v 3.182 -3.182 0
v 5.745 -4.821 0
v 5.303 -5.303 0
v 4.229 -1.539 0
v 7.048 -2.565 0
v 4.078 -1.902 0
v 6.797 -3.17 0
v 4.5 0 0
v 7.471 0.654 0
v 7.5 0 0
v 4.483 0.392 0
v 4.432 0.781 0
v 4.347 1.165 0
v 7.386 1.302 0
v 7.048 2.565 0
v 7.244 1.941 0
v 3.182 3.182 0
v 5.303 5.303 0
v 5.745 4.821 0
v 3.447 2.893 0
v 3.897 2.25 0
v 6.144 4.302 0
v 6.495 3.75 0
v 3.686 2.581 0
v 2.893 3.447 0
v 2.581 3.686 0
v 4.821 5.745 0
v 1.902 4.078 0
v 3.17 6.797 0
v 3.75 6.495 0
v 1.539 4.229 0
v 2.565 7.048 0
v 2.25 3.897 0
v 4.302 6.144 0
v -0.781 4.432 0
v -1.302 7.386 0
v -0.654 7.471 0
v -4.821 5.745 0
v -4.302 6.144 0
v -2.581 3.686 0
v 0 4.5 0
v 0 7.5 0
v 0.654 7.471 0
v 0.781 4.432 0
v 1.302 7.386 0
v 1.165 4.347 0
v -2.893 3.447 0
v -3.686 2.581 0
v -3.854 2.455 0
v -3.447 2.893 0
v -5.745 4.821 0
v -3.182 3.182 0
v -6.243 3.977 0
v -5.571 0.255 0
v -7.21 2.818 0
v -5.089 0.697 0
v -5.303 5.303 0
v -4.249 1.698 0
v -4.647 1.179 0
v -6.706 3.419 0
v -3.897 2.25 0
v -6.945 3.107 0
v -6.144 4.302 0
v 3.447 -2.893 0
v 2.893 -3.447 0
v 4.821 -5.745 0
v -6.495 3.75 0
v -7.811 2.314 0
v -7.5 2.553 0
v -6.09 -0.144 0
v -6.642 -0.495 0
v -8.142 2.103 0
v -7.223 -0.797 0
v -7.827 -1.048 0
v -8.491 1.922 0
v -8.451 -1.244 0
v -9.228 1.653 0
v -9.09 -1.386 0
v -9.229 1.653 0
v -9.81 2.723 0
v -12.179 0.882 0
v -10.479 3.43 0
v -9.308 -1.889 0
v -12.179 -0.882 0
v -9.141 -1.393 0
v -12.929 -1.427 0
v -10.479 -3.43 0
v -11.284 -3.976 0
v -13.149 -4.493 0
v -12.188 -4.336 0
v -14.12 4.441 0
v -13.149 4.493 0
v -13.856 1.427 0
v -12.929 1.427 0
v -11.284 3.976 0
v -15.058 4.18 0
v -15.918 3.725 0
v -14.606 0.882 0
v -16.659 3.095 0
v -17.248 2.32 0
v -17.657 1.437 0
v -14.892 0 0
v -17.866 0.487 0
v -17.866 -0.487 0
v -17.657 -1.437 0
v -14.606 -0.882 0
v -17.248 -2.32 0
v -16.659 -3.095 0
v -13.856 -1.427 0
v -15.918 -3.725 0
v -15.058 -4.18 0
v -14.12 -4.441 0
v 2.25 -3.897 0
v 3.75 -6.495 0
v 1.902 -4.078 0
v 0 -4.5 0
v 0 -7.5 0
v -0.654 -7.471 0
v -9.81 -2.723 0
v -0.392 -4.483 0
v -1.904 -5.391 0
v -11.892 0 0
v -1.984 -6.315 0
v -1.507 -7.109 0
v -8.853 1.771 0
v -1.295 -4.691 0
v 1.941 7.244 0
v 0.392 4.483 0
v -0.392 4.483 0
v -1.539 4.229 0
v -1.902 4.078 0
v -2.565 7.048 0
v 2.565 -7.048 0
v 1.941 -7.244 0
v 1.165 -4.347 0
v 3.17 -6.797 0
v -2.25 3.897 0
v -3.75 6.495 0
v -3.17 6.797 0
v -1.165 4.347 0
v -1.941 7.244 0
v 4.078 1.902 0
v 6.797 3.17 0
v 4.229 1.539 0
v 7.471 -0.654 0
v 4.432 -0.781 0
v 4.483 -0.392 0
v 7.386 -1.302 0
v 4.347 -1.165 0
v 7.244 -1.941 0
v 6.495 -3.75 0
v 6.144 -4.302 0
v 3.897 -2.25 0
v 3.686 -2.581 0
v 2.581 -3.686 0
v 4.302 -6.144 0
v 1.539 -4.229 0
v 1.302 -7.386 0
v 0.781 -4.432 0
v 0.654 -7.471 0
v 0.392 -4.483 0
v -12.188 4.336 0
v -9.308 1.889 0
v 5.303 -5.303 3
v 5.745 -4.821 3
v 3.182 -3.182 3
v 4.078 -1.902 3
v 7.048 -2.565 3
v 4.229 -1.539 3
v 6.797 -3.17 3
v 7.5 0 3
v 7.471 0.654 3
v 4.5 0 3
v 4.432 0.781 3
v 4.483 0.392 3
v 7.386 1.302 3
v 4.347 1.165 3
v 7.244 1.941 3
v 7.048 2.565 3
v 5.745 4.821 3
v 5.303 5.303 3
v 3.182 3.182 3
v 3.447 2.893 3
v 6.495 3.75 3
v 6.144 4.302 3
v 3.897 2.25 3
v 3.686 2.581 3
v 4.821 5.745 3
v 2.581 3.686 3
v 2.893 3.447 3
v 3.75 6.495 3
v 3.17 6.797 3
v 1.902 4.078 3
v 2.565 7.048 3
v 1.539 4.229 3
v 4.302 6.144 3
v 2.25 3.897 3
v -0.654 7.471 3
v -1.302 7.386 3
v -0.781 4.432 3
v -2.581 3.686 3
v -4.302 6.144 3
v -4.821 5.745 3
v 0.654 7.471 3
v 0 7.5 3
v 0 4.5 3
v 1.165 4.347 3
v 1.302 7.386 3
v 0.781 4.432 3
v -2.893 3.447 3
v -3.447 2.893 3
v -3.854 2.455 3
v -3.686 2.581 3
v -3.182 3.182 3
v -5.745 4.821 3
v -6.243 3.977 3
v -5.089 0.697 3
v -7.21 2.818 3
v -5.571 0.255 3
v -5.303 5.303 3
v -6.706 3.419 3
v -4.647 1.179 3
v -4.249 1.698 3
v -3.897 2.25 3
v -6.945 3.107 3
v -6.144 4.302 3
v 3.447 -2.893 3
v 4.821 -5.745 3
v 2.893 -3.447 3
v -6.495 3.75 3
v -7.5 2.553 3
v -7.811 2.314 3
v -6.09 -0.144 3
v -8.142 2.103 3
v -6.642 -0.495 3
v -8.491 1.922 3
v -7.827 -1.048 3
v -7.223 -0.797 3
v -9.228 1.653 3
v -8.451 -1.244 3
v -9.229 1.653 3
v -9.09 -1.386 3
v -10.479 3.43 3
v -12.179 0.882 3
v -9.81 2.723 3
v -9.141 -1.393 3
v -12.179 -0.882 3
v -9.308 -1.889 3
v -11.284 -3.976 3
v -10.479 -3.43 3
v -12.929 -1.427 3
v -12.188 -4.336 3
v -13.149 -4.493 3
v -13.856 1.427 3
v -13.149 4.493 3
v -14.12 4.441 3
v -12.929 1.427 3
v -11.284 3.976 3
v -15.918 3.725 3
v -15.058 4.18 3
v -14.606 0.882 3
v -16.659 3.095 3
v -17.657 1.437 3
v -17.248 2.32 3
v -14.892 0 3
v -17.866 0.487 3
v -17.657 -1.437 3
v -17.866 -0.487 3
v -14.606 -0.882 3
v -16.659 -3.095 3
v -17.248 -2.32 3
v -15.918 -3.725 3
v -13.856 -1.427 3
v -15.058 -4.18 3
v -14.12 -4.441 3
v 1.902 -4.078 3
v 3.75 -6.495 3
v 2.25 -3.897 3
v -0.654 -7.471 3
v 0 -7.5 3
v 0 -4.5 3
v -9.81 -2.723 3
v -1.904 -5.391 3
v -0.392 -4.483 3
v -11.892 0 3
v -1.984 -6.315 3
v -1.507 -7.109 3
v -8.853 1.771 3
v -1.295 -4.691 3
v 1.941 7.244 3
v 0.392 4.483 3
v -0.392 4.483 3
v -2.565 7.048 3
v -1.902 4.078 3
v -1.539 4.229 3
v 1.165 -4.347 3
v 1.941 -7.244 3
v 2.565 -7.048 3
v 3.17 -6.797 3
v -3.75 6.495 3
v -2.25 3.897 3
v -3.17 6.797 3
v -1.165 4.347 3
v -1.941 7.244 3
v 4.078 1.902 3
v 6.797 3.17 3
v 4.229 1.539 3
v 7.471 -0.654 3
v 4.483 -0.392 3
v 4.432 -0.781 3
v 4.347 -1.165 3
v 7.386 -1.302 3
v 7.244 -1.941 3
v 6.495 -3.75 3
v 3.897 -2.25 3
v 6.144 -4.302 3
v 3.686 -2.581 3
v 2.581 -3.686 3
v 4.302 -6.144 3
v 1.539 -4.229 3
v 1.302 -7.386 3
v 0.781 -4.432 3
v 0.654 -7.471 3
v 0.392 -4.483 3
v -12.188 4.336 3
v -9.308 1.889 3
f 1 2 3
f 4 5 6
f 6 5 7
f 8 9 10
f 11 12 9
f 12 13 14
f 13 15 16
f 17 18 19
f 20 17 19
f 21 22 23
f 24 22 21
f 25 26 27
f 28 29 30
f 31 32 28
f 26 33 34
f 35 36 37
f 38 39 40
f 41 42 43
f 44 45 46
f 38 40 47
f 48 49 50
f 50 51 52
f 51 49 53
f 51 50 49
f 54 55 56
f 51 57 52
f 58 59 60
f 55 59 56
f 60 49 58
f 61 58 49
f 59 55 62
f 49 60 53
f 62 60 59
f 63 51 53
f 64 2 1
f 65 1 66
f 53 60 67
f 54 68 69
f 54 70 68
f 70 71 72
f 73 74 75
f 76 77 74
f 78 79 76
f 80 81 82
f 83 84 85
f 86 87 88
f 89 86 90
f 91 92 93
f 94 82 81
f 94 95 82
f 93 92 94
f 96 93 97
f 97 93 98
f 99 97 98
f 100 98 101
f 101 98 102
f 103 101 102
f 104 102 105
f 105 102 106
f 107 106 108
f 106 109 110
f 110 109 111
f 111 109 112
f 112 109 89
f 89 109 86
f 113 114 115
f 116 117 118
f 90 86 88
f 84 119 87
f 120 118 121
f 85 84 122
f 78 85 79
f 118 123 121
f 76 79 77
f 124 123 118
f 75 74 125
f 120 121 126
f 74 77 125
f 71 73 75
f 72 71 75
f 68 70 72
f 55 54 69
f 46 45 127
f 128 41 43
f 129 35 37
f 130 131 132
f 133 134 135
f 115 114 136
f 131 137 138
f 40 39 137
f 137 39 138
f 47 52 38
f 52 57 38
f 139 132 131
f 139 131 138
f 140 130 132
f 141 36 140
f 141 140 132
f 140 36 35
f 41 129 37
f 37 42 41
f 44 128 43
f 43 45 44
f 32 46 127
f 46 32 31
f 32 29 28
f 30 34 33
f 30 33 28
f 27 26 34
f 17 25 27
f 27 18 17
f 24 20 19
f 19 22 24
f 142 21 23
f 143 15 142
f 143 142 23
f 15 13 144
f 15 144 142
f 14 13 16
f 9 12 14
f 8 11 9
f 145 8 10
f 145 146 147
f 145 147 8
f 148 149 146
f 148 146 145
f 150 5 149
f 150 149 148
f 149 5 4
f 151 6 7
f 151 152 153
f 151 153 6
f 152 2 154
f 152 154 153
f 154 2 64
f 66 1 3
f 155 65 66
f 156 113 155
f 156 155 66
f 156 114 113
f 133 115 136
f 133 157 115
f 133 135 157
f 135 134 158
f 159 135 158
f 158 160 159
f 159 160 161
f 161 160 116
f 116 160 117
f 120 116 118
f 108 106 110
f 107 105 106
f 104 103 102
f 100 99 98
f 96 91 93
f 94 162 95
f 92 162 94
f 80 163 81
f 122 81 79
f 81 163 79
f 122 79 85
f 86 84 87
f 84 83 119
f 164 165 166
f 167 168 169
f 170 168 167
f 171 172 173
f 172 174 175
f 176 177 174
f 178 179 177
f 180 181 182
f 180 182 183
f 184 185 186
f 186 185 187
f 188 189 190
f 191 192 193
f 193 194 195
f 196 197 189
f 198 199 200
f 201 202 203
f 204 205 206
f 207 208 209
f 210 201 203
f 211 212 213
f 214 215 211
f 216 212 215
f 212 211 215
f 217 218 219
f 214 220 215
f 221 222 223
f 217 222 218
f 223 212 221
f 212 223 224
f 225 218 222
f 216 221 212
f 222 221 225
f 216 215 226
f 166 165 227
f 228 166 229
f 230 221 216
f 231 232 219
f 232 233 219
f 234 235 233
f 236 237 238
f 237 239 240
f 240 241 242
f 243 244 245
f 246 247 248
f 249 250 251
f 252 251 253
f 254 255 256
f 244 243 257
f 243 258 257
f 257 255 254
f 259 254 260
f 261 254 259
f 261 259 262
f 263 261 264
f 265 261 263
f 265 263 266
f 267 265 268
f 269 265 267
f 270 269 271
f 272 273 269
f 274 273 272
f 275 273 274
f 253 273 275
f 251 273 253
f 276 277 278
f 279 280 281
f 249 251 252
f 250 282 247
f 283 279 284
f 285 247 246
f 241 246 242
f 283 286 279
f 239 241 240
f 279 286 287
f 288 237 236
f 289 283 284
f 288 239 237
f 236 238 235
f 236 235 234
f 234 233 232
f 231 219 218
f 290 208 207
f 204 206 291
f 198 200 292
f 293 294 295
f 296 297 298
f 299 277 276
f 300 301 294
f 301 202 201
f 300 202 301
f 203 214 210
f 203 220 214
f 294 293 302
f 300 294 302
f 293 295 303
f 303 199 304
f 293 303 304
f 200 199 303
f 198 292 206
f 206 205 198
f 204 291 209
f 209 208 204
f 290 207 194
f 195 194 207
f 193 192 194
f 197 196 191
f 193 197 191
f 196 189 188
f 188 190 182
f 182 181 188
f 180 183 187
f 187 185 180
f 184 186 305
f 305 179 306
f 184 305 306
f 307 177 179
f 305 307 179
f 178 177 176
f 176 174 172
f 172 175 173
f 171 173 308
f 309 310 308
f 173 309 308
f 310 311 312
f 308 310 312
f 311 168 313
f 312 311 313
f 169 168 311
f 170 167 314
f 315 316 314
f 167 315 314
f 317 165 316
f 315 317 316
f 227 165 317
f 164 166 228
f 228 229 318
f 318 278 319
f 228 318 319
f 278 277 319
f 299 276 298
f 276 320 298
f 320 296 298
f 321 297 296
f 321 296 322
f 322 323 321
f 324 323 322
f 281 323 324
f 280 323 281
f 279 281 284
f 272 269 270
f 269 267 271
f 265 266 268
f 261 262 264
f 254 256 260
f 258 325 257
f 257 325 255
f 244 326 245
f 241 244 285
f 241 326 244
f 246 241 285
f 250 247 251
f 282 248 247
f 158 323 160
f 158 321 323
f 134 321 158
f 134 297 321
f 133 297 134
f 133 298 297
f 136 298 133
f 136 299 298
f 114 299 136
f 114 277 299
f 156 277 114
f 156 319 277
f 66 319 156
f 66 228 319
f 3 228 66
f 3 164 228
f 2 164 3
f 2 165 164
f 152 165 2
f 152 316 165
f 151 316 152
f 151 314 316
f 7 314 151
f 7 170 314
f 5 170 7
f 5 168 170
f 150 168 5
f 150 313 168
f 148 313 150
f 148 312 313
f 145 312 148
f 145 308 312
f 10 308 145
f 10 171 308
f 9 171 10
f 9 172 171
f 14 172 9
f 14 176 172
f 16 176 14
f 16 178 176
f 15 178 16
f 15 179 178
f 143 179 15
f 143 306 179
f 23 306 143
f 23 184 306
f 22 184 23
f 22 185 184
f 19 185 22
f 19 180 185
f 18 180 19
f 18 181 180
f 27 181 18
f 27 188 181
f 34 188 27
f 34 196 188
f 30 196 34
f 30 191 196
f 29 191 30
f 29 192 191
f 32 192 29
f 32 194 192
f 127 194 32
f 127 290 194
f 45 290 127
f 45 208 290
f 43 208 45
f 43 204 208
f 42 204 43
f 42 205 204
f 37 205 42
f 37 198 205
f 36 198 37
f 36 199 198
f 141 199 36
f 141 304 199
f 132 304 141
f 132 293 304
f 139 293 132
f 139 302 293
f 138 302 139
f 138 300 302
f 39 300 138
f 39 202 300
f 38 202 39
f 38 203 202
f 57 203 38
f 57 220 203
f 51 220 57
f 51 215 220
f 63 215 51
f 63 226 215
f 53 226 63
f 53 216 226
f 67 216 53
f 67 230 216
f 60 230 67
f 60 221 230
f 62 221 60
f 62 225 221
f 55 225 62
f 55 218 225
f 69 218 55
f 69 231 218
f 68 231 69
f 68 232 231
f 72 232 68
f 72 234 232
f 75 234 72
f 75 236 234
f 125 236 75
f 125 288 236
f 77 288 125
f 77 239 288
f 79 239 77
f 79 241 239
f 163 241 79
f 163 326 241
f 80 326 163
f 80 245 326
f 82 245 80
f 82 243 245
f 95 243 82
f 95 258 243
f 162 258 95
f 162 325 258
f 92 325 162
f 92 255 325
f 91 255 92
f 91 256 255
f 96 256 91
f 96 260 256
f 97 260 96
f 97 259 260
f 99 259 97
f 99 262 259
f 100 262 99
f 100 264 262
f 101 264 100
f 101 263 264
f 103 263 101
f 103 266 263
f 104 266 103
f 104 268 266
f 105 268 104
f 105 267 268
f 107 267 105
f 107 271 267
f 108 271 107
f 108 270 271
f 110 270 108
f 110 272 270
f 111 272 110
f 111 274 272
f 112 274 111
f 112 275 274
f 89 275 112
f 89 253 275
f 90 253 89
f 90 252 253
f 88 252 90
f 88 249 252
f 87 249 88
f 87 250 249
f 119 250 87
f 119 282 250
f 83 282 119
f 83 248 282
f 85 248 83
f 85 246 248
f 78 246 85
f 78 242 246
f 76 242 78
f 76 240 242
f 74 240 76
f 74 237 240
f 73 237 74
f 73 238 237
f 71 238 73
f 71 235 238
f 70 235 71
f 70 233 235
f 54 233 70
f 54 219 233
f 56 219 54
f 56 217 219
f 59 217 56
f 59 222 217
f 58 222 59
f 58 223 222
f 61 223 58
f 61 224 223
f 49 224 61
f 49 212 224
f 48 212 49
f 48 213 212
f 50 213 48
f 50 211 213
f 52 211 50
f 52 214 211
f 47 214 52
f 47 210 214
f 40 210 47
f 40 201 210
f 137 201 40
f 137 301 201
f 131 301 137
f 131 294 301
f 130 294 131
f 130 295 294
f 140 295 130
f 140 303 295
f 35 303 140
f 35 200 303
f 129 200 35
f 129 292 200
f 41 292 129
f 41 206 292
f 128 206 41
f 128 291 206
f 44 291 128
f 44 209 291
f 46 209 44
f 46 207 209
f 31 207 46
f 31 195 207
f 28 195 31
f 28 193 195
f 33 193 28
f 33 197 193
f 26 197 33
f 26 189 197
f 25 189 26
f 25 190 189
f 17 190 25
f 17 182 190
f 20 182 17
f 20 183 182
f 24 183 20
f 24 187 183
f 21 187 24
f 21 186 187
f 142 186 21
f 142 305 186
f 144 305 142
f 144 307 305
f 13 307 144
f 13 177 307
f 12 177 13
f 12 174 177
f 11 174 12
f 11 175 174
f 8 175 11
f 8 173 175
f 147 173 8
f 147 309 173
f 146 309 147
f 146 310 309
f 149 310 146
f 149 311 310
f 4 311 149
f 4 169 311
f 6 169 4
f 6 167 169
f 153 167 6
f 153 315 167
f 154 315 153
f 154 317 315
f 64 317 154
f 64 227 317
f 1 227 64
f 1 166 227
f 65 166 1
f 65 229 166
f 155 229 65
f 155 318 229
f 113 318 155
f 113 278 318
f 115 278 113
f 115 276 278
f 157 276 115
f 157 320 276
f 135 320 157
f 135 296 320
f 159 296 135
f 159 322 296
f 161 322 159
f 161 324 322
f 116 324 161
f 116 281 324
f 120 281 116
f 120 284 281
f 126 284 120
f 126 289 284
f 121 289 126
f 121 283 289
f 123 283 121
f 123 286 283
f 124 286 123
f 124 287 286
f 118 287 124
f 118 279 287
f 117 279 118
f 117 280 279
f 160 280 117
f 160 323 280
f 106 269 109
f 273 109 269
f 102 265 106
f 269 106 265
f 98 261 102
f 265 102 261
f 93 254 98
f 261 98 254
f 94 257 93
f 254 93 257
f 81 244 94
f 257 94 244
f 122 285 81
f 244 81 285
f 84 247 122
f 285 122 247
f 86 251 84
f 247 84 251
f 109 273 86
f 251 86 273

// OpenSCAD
// Hook for the toy car
// no idea why it crashes on saving stl when run from command line
// therefore moved to drafts, otherwise fstl stops viewing on corrupted stl
$fs=1/1;
$fa=1/1;
thickness=3; //height of print
width=3;
bend_radius=6;
min_angle=-90; //how strong bend of the hook is
ring_diameter=3; //inner hole
step=5; //kinda like fa

module shape() {
  for (angle=[150-step:-step:min_angle]) hull() {
    rotate(angle) translate([bend_radius,0])circle(d=width);
    rotate(angle-step) translate([bend_radius,0])circle(d=width);
  }
  translate([-bend_radius*sqrt(3),bend_radius,0]) 
  for (angle=[-30:-step:-90+step]) hull() {
    rotate([0,0,angle])translate([bend_radius,0,0])circle(d=width);
    rotate([0,0,angle-step])translate([bend_radius,0,0])circle(d=width);
  }
  translate([-bend_radius*sqrt(3)-width/2-ring_diameter/2,0,0])
  difference() {
    circle(r=ring_diameter/2+width);
    circle(r=ring_diameter/2);
  }
}
linear_extrude(thickness) shape();
//shape();
